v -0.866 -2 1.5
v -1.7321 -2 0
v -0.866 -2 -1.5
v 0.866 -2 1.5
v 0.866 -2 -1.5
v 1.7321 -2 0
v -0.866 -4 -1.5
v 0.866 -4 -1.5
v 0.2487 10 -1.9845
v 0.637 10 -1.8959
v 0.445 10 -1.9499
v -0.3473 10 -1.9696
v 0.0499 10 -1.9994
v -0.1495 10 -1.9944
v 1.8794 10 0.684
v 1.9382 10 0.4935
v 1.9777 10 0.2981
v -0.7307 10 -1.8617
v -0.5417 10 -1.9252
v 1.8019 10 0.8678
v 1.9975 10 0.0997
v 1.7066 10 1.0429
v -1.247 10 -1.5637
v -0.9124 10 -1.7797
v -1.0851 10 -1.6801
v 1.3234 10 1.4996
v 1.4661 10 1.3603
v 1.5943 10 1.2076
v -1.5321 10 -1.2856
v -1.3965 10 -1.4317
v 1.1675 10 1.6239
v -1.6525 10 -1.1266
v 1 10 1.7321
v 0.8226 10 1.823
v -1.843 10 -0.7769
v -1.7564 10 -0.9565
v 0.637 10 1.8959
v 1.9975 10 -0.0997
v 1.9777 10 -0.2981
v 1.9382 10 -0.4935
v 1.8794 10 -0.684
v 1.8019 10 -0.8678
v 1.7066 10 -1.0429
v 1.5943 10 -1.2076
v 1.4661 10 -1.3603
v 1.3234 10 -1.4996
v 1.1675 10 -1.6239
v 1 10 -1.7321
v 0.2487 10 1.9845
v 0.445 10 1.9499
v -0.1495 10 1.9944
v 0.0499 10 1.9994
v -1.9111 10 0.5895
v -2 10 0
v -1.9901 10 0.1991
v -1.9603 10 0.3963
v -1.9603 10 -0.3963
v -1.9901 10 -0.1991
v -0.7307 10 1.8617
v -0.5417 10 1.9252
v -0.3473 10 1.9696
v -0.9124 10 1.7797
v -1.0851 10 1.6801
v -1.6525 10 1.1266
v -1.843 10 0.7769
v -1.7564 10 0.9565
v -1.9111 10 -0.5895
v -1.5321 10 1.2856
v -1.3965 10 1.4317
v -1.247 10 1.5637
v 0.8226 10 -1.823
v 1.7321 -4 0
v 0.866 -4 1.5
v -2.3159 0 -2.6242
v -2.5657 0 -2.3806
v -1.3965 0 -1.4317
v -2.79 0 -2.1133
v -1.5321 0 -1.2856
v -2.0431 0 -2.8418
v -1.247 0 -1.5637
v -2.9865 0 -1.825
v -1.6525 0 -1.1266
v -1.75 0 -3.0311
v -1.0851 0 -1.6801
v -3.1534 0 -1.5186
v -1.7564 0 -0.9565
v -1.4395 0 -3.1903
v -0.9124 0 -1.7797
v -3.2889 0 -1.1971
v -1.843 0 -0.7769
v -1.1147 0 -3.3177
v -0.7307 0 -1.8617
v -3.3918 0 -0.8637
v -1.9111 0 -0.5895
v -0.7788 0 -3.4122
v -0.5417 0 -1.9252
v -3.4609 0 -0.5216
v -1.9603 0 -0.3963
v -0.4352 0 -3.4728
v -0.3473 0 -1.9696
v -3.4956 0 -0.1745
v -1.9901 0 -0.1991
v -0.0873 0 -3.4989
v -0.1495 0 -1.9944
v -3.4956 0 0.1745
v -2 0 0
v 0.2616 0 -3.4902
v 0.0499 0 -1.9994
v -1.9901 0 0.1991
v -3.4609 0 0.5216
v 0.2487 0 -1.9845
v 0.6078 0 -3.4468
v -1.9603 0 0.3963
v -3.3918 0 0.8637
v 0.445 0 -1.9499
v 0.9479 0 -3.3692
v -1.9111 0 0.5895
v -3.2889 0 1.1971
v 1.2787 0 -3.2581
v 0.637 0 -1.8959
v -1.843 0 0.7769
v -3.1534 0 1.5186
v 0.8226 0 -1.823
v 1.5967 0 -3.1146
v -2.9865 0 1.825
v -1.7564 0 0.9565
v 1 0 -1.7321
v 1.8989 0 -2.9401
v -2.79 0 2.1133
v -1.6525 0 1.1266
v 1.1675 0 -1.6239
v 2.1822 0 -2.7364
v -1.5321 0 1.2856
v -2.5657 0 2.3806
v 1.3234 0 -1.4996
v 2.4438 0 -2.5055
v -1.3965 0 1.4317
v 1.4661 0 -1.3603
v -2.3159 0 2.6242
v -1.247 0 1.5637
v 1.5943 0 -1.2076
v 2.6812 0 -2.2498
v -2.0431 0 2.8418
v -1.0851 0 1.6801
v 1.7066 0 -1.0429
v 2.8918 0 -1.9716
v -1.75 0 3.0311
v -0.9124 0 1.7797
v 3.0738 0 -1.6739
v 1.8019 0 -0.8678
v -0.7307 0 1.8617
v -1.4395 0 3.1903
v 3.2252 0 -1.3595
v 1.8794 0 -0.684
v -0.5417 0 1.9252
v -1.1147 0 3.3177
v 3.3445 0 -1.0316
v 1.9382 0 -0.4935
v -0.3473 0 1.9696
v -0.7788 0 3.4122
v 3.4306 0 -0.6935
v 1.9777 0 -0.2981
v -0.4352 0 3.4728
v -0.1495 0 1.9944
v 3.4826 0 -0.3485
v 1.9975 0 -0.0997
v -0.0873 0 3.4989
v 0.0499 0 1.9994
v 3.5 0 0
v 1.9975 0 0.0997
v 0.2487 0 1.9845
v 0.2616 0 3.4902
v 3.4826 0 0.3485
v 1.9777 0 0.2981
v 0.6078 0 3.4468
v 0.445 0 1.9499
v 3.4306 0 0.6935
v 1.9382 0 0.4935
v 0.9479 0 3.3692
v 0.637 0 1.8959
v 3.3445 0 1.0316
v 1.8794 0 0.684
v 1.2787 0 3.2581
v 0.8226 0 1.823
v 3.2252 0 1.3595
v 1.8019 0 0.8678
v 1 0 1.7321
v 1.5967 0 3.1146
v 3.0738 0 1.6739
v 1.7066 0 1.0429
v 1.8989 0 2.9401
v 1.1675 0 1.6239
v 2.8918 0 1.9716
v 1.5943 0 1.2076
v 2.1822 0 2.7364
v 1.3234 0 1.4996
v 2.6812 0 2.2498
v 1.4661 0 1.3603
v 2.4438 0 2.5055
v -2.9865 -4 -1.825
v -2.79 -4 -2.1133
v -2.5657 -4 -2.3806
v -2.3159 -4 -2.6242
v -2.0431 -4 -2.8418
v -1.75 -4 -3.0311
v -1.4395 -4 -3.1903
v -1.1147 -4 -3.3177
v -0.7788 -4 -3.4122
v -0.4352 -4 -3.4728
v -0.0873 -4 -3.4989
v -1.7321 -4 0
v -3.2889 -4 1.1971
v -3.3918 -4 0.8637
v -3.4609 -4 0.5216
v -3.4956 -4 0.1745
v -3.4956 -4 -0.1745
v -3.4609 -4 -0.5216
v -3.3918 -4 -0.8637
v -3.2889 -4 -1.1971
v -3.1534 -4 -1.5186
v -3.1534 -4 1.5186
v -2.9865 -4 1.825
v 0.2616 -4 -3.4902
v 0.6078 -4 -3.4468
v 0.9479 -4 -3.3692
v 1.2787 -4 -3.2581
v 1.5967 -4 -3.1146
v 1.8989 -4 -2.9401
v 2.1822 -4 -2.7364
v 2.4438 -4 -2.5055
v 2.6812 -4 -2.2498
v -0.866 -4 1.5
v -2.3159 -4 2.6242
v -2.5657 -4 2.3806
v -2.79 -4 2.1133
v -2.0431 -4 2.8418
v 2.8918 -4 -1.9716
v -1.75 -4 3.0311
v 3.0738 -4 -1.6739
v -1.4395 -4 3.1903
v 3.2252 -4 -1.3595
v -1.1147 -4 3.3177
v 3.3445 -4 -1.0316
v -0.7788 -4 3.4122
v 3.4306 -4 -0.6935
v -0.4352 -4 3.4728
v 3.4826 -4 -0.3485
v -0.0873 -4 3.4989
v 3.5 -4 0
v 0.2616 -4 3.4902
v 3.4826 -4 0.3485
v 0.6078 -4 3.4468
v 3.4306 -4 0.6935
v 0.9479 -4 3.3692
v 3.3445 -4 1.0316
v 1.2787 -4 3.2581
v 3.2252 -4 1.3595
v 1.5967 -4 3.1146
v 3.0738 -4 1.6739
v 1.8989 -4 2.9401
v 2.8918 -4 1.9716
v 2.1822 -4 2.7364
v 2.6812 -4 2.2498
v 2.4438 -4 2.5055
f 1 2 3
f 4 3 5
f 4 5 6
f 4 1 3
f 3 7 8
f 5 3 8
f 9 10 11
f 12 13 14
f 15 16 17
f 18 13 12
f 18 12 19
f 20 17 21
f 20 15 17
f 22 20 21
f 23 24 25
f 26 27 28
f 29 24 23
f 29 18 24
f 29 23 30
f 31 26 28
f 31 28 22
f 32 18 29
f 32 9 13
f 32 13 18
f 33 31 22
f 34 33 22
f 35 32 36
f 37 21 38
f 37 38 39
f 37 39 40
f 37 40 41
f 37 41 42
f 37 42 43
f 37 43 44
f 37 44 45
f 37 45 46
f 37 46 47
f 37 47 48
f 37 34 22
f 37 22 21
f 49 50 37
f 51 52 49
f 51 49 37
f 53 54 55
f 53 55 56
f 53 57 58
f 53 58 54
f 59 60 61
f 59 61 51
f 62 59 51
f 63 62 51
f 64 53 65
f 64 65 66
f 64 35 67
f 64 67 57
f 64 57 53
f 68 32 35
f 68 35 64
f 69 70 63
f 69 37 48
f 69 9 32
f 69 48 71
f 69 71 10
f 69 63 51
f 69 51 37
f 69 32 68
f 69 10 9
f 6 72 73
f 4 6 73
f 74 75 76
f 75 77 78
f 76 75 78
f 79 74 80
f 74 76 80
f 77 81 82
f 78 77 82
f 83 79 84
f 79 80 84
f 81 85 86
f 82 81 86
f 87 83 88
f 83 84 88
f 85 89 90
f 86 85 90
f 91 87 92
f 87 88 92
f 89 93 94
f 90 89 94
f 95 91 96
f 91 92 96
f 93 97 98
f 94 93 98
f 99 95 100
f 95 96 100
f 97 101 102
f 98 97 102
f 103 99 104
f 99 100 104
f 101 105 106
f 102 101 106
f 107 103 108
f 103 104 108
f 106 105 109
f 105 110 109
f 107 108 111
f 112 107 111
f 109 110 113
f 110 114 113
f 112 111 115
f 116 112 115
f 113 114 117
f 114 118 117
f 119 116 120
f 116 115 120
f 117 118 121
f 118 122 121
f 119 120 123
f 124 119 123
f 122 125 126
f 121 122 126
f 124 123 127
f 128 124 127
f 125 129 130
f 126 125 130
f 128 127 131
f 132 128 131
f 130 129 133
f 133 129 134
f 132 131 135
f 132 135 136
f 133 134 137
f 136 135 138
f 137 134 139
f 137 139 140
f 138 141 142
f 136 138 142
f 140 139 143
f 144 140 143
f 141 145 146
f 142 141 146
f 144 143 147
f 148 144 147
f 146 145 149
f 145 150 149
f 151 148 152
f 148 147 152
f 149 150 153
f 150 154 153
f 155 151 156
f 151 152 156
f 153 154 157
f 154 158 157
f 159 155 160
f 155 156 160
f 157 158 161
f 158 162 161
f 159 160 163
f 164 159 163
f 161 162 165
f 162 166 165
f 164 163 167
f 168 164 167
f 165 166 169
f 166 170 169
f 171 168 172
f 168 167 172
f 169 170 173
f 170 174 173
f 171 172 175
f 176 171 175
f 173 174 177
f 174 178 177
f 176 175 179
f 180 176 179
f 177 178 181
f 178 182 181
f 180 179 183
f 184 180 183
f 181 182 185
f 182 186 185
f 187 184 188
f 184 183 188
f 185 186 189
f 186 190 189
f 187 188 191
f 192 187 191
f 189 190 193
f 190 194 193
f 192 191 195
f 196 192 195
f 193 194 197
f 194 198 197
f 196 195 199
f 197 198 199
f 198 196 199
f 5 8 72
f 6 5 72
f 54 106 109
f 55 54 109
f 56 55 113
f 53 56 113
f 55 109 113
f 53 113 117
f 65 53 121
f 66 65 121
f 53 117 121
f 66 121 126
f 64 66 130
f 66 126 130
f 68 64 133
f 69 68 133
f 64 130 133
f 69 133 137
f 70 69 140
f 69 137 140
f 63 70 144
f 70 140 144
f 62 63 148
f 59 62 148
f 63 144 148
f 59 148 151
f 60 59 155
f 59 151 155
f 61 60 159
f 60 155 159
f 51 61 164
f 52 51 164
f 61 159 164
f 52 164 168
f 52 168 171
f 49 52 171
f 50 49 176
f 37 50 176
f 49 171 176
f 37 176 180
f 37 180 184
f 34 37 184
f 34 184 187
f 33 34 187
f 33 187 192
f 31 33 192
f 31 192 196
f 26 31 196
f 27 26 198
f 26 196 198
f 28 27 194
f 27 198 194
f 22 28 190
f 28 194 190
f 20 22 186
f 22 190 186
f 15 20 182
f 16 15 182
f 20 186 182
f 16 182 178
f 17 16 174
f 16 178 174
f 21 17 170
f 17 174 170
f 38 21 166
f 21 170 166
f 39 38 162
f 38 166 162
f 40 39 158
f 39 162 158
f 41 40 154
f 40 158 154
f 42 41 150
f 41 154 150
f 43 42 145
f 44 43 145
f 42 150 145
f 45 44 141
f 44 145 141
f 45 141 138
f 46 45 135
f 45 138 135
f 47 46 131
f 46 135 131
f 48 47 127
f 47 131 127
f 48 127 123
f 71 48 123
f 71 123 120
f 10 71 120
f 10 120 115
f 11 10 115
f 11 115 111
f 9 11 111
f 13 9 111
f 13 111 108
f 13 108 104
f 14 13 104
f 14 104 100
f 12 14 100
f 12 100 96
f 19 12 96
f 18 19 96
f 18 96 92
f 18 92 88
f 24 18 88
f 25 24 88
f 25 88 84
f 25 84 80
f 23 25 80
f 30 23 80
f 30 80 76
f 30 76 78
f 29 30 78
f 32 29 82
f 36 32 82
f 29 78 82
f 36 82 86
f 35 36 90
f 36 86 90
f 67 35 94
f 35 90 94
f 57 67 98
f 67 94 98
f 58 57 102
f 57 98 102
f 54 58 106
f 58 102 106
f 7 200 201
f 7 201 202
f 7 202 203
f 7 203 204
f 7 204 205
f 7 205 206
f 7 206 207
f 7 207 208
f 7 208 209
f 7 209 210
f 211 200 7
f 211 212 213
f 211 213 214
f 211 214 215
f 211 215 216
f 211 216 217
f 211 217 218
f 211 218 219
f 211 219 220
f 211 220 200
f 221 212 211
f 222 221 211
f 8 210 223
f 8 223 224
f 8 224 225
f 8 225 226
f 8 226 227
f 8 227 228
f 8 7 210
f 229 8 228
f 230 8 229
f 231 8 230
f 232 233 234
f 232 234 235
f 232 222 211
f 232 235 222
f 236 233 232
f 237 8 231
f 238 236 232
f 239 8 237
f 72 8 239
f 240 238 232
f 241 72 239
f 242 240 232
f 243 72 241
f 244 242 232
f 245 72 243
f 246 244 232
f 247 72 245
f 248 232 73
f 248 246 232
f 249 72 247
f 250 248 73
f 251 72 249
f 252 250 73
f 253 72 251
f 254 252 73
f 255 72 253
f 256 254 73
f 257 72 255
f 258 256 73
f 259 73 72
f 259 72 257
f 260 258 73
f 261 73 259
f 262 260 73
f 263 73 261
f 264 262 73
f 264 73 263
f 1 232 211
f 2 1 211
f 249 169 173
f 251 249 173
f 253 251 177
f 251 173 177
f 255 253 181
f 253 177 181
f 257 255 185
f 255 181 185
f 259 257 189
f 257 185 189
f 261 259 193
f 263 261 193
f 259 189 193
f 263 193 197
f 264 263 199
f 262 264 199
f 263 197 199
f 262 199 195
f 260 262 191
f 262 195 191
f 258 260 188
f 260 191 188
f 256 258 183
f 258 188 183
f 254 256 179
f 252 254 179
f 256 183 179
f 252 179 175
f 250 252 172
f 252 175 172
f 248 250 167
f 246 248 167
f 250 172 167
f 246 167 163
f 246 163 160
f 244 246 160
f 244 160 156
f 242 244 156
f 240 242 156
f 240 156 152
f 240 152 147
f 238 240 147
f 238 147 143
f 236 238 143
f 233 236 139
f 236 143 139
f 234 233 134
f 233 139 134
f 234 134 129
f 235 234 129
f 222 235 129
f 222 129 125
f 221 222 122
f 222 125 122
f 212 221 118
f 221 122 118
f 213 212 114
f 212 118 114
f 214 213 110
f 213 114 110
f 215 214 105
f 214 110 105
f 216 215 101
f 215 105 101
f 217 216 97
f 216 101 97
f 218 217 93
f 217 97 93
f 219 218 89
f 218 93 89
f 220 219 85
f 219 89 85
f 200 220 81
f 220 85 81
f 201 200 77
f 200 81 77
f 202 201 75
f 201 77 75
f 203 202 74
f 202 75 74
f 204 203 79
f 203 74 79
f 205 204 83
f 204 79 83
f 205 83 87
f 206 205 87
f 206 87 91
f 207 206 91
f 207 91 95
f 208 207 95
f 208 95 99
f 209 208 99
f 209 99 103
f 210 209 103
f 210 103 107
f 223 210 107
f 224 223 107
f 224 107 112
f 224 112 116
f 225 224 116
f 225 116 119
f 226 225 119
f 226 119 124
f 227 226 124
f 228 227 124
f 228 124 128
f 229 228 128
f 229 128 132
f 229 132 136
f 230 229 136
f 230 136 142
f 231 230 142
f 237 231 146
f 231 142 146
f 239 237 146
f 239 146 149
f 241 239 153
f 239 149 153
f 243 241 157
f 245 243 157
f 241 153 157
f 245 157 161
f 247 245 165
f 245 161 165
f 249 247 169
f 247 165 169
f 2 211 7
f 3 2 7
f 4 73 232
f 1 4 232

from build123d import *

# Parameters (mm, degrees)
F0_R     = 3.5
F1_DEPTH = 4
F2_R     = 2
F3_DEPTH = 10
F5_DEPTH = 2


with BuildPart() as f1:
    # F0 (on Front) → F1 (new body)
    with BuildSketch(Plane.XZ):
        Circle(F0_R)
    extrude(amount=F1_DEPTH)

    # F2 (on face) → F3 (join)
    with BuildSketch(Plane(origin=(0, 0, 0), x_dir=(-1, 0, 0), z_dir=(0, 1, 0))):
        Circle(F2_R)
    extrude(amount=F3_DEPTH)

    # F4 (on face) → F5 (cut)
    with BuildSketch(Plane.XZ.offset(4)):
        Polygon((0.866025, 1.5), (-0.866025, 1.5), (-1.732051, 0), (-0.866025, -1.5), (0.866025, -1.5), (1.732051, 0), align=None)
    extrude(amount=-F5_DEPTH, mode=Mode.SUBTRACT)


solid = f1.part
